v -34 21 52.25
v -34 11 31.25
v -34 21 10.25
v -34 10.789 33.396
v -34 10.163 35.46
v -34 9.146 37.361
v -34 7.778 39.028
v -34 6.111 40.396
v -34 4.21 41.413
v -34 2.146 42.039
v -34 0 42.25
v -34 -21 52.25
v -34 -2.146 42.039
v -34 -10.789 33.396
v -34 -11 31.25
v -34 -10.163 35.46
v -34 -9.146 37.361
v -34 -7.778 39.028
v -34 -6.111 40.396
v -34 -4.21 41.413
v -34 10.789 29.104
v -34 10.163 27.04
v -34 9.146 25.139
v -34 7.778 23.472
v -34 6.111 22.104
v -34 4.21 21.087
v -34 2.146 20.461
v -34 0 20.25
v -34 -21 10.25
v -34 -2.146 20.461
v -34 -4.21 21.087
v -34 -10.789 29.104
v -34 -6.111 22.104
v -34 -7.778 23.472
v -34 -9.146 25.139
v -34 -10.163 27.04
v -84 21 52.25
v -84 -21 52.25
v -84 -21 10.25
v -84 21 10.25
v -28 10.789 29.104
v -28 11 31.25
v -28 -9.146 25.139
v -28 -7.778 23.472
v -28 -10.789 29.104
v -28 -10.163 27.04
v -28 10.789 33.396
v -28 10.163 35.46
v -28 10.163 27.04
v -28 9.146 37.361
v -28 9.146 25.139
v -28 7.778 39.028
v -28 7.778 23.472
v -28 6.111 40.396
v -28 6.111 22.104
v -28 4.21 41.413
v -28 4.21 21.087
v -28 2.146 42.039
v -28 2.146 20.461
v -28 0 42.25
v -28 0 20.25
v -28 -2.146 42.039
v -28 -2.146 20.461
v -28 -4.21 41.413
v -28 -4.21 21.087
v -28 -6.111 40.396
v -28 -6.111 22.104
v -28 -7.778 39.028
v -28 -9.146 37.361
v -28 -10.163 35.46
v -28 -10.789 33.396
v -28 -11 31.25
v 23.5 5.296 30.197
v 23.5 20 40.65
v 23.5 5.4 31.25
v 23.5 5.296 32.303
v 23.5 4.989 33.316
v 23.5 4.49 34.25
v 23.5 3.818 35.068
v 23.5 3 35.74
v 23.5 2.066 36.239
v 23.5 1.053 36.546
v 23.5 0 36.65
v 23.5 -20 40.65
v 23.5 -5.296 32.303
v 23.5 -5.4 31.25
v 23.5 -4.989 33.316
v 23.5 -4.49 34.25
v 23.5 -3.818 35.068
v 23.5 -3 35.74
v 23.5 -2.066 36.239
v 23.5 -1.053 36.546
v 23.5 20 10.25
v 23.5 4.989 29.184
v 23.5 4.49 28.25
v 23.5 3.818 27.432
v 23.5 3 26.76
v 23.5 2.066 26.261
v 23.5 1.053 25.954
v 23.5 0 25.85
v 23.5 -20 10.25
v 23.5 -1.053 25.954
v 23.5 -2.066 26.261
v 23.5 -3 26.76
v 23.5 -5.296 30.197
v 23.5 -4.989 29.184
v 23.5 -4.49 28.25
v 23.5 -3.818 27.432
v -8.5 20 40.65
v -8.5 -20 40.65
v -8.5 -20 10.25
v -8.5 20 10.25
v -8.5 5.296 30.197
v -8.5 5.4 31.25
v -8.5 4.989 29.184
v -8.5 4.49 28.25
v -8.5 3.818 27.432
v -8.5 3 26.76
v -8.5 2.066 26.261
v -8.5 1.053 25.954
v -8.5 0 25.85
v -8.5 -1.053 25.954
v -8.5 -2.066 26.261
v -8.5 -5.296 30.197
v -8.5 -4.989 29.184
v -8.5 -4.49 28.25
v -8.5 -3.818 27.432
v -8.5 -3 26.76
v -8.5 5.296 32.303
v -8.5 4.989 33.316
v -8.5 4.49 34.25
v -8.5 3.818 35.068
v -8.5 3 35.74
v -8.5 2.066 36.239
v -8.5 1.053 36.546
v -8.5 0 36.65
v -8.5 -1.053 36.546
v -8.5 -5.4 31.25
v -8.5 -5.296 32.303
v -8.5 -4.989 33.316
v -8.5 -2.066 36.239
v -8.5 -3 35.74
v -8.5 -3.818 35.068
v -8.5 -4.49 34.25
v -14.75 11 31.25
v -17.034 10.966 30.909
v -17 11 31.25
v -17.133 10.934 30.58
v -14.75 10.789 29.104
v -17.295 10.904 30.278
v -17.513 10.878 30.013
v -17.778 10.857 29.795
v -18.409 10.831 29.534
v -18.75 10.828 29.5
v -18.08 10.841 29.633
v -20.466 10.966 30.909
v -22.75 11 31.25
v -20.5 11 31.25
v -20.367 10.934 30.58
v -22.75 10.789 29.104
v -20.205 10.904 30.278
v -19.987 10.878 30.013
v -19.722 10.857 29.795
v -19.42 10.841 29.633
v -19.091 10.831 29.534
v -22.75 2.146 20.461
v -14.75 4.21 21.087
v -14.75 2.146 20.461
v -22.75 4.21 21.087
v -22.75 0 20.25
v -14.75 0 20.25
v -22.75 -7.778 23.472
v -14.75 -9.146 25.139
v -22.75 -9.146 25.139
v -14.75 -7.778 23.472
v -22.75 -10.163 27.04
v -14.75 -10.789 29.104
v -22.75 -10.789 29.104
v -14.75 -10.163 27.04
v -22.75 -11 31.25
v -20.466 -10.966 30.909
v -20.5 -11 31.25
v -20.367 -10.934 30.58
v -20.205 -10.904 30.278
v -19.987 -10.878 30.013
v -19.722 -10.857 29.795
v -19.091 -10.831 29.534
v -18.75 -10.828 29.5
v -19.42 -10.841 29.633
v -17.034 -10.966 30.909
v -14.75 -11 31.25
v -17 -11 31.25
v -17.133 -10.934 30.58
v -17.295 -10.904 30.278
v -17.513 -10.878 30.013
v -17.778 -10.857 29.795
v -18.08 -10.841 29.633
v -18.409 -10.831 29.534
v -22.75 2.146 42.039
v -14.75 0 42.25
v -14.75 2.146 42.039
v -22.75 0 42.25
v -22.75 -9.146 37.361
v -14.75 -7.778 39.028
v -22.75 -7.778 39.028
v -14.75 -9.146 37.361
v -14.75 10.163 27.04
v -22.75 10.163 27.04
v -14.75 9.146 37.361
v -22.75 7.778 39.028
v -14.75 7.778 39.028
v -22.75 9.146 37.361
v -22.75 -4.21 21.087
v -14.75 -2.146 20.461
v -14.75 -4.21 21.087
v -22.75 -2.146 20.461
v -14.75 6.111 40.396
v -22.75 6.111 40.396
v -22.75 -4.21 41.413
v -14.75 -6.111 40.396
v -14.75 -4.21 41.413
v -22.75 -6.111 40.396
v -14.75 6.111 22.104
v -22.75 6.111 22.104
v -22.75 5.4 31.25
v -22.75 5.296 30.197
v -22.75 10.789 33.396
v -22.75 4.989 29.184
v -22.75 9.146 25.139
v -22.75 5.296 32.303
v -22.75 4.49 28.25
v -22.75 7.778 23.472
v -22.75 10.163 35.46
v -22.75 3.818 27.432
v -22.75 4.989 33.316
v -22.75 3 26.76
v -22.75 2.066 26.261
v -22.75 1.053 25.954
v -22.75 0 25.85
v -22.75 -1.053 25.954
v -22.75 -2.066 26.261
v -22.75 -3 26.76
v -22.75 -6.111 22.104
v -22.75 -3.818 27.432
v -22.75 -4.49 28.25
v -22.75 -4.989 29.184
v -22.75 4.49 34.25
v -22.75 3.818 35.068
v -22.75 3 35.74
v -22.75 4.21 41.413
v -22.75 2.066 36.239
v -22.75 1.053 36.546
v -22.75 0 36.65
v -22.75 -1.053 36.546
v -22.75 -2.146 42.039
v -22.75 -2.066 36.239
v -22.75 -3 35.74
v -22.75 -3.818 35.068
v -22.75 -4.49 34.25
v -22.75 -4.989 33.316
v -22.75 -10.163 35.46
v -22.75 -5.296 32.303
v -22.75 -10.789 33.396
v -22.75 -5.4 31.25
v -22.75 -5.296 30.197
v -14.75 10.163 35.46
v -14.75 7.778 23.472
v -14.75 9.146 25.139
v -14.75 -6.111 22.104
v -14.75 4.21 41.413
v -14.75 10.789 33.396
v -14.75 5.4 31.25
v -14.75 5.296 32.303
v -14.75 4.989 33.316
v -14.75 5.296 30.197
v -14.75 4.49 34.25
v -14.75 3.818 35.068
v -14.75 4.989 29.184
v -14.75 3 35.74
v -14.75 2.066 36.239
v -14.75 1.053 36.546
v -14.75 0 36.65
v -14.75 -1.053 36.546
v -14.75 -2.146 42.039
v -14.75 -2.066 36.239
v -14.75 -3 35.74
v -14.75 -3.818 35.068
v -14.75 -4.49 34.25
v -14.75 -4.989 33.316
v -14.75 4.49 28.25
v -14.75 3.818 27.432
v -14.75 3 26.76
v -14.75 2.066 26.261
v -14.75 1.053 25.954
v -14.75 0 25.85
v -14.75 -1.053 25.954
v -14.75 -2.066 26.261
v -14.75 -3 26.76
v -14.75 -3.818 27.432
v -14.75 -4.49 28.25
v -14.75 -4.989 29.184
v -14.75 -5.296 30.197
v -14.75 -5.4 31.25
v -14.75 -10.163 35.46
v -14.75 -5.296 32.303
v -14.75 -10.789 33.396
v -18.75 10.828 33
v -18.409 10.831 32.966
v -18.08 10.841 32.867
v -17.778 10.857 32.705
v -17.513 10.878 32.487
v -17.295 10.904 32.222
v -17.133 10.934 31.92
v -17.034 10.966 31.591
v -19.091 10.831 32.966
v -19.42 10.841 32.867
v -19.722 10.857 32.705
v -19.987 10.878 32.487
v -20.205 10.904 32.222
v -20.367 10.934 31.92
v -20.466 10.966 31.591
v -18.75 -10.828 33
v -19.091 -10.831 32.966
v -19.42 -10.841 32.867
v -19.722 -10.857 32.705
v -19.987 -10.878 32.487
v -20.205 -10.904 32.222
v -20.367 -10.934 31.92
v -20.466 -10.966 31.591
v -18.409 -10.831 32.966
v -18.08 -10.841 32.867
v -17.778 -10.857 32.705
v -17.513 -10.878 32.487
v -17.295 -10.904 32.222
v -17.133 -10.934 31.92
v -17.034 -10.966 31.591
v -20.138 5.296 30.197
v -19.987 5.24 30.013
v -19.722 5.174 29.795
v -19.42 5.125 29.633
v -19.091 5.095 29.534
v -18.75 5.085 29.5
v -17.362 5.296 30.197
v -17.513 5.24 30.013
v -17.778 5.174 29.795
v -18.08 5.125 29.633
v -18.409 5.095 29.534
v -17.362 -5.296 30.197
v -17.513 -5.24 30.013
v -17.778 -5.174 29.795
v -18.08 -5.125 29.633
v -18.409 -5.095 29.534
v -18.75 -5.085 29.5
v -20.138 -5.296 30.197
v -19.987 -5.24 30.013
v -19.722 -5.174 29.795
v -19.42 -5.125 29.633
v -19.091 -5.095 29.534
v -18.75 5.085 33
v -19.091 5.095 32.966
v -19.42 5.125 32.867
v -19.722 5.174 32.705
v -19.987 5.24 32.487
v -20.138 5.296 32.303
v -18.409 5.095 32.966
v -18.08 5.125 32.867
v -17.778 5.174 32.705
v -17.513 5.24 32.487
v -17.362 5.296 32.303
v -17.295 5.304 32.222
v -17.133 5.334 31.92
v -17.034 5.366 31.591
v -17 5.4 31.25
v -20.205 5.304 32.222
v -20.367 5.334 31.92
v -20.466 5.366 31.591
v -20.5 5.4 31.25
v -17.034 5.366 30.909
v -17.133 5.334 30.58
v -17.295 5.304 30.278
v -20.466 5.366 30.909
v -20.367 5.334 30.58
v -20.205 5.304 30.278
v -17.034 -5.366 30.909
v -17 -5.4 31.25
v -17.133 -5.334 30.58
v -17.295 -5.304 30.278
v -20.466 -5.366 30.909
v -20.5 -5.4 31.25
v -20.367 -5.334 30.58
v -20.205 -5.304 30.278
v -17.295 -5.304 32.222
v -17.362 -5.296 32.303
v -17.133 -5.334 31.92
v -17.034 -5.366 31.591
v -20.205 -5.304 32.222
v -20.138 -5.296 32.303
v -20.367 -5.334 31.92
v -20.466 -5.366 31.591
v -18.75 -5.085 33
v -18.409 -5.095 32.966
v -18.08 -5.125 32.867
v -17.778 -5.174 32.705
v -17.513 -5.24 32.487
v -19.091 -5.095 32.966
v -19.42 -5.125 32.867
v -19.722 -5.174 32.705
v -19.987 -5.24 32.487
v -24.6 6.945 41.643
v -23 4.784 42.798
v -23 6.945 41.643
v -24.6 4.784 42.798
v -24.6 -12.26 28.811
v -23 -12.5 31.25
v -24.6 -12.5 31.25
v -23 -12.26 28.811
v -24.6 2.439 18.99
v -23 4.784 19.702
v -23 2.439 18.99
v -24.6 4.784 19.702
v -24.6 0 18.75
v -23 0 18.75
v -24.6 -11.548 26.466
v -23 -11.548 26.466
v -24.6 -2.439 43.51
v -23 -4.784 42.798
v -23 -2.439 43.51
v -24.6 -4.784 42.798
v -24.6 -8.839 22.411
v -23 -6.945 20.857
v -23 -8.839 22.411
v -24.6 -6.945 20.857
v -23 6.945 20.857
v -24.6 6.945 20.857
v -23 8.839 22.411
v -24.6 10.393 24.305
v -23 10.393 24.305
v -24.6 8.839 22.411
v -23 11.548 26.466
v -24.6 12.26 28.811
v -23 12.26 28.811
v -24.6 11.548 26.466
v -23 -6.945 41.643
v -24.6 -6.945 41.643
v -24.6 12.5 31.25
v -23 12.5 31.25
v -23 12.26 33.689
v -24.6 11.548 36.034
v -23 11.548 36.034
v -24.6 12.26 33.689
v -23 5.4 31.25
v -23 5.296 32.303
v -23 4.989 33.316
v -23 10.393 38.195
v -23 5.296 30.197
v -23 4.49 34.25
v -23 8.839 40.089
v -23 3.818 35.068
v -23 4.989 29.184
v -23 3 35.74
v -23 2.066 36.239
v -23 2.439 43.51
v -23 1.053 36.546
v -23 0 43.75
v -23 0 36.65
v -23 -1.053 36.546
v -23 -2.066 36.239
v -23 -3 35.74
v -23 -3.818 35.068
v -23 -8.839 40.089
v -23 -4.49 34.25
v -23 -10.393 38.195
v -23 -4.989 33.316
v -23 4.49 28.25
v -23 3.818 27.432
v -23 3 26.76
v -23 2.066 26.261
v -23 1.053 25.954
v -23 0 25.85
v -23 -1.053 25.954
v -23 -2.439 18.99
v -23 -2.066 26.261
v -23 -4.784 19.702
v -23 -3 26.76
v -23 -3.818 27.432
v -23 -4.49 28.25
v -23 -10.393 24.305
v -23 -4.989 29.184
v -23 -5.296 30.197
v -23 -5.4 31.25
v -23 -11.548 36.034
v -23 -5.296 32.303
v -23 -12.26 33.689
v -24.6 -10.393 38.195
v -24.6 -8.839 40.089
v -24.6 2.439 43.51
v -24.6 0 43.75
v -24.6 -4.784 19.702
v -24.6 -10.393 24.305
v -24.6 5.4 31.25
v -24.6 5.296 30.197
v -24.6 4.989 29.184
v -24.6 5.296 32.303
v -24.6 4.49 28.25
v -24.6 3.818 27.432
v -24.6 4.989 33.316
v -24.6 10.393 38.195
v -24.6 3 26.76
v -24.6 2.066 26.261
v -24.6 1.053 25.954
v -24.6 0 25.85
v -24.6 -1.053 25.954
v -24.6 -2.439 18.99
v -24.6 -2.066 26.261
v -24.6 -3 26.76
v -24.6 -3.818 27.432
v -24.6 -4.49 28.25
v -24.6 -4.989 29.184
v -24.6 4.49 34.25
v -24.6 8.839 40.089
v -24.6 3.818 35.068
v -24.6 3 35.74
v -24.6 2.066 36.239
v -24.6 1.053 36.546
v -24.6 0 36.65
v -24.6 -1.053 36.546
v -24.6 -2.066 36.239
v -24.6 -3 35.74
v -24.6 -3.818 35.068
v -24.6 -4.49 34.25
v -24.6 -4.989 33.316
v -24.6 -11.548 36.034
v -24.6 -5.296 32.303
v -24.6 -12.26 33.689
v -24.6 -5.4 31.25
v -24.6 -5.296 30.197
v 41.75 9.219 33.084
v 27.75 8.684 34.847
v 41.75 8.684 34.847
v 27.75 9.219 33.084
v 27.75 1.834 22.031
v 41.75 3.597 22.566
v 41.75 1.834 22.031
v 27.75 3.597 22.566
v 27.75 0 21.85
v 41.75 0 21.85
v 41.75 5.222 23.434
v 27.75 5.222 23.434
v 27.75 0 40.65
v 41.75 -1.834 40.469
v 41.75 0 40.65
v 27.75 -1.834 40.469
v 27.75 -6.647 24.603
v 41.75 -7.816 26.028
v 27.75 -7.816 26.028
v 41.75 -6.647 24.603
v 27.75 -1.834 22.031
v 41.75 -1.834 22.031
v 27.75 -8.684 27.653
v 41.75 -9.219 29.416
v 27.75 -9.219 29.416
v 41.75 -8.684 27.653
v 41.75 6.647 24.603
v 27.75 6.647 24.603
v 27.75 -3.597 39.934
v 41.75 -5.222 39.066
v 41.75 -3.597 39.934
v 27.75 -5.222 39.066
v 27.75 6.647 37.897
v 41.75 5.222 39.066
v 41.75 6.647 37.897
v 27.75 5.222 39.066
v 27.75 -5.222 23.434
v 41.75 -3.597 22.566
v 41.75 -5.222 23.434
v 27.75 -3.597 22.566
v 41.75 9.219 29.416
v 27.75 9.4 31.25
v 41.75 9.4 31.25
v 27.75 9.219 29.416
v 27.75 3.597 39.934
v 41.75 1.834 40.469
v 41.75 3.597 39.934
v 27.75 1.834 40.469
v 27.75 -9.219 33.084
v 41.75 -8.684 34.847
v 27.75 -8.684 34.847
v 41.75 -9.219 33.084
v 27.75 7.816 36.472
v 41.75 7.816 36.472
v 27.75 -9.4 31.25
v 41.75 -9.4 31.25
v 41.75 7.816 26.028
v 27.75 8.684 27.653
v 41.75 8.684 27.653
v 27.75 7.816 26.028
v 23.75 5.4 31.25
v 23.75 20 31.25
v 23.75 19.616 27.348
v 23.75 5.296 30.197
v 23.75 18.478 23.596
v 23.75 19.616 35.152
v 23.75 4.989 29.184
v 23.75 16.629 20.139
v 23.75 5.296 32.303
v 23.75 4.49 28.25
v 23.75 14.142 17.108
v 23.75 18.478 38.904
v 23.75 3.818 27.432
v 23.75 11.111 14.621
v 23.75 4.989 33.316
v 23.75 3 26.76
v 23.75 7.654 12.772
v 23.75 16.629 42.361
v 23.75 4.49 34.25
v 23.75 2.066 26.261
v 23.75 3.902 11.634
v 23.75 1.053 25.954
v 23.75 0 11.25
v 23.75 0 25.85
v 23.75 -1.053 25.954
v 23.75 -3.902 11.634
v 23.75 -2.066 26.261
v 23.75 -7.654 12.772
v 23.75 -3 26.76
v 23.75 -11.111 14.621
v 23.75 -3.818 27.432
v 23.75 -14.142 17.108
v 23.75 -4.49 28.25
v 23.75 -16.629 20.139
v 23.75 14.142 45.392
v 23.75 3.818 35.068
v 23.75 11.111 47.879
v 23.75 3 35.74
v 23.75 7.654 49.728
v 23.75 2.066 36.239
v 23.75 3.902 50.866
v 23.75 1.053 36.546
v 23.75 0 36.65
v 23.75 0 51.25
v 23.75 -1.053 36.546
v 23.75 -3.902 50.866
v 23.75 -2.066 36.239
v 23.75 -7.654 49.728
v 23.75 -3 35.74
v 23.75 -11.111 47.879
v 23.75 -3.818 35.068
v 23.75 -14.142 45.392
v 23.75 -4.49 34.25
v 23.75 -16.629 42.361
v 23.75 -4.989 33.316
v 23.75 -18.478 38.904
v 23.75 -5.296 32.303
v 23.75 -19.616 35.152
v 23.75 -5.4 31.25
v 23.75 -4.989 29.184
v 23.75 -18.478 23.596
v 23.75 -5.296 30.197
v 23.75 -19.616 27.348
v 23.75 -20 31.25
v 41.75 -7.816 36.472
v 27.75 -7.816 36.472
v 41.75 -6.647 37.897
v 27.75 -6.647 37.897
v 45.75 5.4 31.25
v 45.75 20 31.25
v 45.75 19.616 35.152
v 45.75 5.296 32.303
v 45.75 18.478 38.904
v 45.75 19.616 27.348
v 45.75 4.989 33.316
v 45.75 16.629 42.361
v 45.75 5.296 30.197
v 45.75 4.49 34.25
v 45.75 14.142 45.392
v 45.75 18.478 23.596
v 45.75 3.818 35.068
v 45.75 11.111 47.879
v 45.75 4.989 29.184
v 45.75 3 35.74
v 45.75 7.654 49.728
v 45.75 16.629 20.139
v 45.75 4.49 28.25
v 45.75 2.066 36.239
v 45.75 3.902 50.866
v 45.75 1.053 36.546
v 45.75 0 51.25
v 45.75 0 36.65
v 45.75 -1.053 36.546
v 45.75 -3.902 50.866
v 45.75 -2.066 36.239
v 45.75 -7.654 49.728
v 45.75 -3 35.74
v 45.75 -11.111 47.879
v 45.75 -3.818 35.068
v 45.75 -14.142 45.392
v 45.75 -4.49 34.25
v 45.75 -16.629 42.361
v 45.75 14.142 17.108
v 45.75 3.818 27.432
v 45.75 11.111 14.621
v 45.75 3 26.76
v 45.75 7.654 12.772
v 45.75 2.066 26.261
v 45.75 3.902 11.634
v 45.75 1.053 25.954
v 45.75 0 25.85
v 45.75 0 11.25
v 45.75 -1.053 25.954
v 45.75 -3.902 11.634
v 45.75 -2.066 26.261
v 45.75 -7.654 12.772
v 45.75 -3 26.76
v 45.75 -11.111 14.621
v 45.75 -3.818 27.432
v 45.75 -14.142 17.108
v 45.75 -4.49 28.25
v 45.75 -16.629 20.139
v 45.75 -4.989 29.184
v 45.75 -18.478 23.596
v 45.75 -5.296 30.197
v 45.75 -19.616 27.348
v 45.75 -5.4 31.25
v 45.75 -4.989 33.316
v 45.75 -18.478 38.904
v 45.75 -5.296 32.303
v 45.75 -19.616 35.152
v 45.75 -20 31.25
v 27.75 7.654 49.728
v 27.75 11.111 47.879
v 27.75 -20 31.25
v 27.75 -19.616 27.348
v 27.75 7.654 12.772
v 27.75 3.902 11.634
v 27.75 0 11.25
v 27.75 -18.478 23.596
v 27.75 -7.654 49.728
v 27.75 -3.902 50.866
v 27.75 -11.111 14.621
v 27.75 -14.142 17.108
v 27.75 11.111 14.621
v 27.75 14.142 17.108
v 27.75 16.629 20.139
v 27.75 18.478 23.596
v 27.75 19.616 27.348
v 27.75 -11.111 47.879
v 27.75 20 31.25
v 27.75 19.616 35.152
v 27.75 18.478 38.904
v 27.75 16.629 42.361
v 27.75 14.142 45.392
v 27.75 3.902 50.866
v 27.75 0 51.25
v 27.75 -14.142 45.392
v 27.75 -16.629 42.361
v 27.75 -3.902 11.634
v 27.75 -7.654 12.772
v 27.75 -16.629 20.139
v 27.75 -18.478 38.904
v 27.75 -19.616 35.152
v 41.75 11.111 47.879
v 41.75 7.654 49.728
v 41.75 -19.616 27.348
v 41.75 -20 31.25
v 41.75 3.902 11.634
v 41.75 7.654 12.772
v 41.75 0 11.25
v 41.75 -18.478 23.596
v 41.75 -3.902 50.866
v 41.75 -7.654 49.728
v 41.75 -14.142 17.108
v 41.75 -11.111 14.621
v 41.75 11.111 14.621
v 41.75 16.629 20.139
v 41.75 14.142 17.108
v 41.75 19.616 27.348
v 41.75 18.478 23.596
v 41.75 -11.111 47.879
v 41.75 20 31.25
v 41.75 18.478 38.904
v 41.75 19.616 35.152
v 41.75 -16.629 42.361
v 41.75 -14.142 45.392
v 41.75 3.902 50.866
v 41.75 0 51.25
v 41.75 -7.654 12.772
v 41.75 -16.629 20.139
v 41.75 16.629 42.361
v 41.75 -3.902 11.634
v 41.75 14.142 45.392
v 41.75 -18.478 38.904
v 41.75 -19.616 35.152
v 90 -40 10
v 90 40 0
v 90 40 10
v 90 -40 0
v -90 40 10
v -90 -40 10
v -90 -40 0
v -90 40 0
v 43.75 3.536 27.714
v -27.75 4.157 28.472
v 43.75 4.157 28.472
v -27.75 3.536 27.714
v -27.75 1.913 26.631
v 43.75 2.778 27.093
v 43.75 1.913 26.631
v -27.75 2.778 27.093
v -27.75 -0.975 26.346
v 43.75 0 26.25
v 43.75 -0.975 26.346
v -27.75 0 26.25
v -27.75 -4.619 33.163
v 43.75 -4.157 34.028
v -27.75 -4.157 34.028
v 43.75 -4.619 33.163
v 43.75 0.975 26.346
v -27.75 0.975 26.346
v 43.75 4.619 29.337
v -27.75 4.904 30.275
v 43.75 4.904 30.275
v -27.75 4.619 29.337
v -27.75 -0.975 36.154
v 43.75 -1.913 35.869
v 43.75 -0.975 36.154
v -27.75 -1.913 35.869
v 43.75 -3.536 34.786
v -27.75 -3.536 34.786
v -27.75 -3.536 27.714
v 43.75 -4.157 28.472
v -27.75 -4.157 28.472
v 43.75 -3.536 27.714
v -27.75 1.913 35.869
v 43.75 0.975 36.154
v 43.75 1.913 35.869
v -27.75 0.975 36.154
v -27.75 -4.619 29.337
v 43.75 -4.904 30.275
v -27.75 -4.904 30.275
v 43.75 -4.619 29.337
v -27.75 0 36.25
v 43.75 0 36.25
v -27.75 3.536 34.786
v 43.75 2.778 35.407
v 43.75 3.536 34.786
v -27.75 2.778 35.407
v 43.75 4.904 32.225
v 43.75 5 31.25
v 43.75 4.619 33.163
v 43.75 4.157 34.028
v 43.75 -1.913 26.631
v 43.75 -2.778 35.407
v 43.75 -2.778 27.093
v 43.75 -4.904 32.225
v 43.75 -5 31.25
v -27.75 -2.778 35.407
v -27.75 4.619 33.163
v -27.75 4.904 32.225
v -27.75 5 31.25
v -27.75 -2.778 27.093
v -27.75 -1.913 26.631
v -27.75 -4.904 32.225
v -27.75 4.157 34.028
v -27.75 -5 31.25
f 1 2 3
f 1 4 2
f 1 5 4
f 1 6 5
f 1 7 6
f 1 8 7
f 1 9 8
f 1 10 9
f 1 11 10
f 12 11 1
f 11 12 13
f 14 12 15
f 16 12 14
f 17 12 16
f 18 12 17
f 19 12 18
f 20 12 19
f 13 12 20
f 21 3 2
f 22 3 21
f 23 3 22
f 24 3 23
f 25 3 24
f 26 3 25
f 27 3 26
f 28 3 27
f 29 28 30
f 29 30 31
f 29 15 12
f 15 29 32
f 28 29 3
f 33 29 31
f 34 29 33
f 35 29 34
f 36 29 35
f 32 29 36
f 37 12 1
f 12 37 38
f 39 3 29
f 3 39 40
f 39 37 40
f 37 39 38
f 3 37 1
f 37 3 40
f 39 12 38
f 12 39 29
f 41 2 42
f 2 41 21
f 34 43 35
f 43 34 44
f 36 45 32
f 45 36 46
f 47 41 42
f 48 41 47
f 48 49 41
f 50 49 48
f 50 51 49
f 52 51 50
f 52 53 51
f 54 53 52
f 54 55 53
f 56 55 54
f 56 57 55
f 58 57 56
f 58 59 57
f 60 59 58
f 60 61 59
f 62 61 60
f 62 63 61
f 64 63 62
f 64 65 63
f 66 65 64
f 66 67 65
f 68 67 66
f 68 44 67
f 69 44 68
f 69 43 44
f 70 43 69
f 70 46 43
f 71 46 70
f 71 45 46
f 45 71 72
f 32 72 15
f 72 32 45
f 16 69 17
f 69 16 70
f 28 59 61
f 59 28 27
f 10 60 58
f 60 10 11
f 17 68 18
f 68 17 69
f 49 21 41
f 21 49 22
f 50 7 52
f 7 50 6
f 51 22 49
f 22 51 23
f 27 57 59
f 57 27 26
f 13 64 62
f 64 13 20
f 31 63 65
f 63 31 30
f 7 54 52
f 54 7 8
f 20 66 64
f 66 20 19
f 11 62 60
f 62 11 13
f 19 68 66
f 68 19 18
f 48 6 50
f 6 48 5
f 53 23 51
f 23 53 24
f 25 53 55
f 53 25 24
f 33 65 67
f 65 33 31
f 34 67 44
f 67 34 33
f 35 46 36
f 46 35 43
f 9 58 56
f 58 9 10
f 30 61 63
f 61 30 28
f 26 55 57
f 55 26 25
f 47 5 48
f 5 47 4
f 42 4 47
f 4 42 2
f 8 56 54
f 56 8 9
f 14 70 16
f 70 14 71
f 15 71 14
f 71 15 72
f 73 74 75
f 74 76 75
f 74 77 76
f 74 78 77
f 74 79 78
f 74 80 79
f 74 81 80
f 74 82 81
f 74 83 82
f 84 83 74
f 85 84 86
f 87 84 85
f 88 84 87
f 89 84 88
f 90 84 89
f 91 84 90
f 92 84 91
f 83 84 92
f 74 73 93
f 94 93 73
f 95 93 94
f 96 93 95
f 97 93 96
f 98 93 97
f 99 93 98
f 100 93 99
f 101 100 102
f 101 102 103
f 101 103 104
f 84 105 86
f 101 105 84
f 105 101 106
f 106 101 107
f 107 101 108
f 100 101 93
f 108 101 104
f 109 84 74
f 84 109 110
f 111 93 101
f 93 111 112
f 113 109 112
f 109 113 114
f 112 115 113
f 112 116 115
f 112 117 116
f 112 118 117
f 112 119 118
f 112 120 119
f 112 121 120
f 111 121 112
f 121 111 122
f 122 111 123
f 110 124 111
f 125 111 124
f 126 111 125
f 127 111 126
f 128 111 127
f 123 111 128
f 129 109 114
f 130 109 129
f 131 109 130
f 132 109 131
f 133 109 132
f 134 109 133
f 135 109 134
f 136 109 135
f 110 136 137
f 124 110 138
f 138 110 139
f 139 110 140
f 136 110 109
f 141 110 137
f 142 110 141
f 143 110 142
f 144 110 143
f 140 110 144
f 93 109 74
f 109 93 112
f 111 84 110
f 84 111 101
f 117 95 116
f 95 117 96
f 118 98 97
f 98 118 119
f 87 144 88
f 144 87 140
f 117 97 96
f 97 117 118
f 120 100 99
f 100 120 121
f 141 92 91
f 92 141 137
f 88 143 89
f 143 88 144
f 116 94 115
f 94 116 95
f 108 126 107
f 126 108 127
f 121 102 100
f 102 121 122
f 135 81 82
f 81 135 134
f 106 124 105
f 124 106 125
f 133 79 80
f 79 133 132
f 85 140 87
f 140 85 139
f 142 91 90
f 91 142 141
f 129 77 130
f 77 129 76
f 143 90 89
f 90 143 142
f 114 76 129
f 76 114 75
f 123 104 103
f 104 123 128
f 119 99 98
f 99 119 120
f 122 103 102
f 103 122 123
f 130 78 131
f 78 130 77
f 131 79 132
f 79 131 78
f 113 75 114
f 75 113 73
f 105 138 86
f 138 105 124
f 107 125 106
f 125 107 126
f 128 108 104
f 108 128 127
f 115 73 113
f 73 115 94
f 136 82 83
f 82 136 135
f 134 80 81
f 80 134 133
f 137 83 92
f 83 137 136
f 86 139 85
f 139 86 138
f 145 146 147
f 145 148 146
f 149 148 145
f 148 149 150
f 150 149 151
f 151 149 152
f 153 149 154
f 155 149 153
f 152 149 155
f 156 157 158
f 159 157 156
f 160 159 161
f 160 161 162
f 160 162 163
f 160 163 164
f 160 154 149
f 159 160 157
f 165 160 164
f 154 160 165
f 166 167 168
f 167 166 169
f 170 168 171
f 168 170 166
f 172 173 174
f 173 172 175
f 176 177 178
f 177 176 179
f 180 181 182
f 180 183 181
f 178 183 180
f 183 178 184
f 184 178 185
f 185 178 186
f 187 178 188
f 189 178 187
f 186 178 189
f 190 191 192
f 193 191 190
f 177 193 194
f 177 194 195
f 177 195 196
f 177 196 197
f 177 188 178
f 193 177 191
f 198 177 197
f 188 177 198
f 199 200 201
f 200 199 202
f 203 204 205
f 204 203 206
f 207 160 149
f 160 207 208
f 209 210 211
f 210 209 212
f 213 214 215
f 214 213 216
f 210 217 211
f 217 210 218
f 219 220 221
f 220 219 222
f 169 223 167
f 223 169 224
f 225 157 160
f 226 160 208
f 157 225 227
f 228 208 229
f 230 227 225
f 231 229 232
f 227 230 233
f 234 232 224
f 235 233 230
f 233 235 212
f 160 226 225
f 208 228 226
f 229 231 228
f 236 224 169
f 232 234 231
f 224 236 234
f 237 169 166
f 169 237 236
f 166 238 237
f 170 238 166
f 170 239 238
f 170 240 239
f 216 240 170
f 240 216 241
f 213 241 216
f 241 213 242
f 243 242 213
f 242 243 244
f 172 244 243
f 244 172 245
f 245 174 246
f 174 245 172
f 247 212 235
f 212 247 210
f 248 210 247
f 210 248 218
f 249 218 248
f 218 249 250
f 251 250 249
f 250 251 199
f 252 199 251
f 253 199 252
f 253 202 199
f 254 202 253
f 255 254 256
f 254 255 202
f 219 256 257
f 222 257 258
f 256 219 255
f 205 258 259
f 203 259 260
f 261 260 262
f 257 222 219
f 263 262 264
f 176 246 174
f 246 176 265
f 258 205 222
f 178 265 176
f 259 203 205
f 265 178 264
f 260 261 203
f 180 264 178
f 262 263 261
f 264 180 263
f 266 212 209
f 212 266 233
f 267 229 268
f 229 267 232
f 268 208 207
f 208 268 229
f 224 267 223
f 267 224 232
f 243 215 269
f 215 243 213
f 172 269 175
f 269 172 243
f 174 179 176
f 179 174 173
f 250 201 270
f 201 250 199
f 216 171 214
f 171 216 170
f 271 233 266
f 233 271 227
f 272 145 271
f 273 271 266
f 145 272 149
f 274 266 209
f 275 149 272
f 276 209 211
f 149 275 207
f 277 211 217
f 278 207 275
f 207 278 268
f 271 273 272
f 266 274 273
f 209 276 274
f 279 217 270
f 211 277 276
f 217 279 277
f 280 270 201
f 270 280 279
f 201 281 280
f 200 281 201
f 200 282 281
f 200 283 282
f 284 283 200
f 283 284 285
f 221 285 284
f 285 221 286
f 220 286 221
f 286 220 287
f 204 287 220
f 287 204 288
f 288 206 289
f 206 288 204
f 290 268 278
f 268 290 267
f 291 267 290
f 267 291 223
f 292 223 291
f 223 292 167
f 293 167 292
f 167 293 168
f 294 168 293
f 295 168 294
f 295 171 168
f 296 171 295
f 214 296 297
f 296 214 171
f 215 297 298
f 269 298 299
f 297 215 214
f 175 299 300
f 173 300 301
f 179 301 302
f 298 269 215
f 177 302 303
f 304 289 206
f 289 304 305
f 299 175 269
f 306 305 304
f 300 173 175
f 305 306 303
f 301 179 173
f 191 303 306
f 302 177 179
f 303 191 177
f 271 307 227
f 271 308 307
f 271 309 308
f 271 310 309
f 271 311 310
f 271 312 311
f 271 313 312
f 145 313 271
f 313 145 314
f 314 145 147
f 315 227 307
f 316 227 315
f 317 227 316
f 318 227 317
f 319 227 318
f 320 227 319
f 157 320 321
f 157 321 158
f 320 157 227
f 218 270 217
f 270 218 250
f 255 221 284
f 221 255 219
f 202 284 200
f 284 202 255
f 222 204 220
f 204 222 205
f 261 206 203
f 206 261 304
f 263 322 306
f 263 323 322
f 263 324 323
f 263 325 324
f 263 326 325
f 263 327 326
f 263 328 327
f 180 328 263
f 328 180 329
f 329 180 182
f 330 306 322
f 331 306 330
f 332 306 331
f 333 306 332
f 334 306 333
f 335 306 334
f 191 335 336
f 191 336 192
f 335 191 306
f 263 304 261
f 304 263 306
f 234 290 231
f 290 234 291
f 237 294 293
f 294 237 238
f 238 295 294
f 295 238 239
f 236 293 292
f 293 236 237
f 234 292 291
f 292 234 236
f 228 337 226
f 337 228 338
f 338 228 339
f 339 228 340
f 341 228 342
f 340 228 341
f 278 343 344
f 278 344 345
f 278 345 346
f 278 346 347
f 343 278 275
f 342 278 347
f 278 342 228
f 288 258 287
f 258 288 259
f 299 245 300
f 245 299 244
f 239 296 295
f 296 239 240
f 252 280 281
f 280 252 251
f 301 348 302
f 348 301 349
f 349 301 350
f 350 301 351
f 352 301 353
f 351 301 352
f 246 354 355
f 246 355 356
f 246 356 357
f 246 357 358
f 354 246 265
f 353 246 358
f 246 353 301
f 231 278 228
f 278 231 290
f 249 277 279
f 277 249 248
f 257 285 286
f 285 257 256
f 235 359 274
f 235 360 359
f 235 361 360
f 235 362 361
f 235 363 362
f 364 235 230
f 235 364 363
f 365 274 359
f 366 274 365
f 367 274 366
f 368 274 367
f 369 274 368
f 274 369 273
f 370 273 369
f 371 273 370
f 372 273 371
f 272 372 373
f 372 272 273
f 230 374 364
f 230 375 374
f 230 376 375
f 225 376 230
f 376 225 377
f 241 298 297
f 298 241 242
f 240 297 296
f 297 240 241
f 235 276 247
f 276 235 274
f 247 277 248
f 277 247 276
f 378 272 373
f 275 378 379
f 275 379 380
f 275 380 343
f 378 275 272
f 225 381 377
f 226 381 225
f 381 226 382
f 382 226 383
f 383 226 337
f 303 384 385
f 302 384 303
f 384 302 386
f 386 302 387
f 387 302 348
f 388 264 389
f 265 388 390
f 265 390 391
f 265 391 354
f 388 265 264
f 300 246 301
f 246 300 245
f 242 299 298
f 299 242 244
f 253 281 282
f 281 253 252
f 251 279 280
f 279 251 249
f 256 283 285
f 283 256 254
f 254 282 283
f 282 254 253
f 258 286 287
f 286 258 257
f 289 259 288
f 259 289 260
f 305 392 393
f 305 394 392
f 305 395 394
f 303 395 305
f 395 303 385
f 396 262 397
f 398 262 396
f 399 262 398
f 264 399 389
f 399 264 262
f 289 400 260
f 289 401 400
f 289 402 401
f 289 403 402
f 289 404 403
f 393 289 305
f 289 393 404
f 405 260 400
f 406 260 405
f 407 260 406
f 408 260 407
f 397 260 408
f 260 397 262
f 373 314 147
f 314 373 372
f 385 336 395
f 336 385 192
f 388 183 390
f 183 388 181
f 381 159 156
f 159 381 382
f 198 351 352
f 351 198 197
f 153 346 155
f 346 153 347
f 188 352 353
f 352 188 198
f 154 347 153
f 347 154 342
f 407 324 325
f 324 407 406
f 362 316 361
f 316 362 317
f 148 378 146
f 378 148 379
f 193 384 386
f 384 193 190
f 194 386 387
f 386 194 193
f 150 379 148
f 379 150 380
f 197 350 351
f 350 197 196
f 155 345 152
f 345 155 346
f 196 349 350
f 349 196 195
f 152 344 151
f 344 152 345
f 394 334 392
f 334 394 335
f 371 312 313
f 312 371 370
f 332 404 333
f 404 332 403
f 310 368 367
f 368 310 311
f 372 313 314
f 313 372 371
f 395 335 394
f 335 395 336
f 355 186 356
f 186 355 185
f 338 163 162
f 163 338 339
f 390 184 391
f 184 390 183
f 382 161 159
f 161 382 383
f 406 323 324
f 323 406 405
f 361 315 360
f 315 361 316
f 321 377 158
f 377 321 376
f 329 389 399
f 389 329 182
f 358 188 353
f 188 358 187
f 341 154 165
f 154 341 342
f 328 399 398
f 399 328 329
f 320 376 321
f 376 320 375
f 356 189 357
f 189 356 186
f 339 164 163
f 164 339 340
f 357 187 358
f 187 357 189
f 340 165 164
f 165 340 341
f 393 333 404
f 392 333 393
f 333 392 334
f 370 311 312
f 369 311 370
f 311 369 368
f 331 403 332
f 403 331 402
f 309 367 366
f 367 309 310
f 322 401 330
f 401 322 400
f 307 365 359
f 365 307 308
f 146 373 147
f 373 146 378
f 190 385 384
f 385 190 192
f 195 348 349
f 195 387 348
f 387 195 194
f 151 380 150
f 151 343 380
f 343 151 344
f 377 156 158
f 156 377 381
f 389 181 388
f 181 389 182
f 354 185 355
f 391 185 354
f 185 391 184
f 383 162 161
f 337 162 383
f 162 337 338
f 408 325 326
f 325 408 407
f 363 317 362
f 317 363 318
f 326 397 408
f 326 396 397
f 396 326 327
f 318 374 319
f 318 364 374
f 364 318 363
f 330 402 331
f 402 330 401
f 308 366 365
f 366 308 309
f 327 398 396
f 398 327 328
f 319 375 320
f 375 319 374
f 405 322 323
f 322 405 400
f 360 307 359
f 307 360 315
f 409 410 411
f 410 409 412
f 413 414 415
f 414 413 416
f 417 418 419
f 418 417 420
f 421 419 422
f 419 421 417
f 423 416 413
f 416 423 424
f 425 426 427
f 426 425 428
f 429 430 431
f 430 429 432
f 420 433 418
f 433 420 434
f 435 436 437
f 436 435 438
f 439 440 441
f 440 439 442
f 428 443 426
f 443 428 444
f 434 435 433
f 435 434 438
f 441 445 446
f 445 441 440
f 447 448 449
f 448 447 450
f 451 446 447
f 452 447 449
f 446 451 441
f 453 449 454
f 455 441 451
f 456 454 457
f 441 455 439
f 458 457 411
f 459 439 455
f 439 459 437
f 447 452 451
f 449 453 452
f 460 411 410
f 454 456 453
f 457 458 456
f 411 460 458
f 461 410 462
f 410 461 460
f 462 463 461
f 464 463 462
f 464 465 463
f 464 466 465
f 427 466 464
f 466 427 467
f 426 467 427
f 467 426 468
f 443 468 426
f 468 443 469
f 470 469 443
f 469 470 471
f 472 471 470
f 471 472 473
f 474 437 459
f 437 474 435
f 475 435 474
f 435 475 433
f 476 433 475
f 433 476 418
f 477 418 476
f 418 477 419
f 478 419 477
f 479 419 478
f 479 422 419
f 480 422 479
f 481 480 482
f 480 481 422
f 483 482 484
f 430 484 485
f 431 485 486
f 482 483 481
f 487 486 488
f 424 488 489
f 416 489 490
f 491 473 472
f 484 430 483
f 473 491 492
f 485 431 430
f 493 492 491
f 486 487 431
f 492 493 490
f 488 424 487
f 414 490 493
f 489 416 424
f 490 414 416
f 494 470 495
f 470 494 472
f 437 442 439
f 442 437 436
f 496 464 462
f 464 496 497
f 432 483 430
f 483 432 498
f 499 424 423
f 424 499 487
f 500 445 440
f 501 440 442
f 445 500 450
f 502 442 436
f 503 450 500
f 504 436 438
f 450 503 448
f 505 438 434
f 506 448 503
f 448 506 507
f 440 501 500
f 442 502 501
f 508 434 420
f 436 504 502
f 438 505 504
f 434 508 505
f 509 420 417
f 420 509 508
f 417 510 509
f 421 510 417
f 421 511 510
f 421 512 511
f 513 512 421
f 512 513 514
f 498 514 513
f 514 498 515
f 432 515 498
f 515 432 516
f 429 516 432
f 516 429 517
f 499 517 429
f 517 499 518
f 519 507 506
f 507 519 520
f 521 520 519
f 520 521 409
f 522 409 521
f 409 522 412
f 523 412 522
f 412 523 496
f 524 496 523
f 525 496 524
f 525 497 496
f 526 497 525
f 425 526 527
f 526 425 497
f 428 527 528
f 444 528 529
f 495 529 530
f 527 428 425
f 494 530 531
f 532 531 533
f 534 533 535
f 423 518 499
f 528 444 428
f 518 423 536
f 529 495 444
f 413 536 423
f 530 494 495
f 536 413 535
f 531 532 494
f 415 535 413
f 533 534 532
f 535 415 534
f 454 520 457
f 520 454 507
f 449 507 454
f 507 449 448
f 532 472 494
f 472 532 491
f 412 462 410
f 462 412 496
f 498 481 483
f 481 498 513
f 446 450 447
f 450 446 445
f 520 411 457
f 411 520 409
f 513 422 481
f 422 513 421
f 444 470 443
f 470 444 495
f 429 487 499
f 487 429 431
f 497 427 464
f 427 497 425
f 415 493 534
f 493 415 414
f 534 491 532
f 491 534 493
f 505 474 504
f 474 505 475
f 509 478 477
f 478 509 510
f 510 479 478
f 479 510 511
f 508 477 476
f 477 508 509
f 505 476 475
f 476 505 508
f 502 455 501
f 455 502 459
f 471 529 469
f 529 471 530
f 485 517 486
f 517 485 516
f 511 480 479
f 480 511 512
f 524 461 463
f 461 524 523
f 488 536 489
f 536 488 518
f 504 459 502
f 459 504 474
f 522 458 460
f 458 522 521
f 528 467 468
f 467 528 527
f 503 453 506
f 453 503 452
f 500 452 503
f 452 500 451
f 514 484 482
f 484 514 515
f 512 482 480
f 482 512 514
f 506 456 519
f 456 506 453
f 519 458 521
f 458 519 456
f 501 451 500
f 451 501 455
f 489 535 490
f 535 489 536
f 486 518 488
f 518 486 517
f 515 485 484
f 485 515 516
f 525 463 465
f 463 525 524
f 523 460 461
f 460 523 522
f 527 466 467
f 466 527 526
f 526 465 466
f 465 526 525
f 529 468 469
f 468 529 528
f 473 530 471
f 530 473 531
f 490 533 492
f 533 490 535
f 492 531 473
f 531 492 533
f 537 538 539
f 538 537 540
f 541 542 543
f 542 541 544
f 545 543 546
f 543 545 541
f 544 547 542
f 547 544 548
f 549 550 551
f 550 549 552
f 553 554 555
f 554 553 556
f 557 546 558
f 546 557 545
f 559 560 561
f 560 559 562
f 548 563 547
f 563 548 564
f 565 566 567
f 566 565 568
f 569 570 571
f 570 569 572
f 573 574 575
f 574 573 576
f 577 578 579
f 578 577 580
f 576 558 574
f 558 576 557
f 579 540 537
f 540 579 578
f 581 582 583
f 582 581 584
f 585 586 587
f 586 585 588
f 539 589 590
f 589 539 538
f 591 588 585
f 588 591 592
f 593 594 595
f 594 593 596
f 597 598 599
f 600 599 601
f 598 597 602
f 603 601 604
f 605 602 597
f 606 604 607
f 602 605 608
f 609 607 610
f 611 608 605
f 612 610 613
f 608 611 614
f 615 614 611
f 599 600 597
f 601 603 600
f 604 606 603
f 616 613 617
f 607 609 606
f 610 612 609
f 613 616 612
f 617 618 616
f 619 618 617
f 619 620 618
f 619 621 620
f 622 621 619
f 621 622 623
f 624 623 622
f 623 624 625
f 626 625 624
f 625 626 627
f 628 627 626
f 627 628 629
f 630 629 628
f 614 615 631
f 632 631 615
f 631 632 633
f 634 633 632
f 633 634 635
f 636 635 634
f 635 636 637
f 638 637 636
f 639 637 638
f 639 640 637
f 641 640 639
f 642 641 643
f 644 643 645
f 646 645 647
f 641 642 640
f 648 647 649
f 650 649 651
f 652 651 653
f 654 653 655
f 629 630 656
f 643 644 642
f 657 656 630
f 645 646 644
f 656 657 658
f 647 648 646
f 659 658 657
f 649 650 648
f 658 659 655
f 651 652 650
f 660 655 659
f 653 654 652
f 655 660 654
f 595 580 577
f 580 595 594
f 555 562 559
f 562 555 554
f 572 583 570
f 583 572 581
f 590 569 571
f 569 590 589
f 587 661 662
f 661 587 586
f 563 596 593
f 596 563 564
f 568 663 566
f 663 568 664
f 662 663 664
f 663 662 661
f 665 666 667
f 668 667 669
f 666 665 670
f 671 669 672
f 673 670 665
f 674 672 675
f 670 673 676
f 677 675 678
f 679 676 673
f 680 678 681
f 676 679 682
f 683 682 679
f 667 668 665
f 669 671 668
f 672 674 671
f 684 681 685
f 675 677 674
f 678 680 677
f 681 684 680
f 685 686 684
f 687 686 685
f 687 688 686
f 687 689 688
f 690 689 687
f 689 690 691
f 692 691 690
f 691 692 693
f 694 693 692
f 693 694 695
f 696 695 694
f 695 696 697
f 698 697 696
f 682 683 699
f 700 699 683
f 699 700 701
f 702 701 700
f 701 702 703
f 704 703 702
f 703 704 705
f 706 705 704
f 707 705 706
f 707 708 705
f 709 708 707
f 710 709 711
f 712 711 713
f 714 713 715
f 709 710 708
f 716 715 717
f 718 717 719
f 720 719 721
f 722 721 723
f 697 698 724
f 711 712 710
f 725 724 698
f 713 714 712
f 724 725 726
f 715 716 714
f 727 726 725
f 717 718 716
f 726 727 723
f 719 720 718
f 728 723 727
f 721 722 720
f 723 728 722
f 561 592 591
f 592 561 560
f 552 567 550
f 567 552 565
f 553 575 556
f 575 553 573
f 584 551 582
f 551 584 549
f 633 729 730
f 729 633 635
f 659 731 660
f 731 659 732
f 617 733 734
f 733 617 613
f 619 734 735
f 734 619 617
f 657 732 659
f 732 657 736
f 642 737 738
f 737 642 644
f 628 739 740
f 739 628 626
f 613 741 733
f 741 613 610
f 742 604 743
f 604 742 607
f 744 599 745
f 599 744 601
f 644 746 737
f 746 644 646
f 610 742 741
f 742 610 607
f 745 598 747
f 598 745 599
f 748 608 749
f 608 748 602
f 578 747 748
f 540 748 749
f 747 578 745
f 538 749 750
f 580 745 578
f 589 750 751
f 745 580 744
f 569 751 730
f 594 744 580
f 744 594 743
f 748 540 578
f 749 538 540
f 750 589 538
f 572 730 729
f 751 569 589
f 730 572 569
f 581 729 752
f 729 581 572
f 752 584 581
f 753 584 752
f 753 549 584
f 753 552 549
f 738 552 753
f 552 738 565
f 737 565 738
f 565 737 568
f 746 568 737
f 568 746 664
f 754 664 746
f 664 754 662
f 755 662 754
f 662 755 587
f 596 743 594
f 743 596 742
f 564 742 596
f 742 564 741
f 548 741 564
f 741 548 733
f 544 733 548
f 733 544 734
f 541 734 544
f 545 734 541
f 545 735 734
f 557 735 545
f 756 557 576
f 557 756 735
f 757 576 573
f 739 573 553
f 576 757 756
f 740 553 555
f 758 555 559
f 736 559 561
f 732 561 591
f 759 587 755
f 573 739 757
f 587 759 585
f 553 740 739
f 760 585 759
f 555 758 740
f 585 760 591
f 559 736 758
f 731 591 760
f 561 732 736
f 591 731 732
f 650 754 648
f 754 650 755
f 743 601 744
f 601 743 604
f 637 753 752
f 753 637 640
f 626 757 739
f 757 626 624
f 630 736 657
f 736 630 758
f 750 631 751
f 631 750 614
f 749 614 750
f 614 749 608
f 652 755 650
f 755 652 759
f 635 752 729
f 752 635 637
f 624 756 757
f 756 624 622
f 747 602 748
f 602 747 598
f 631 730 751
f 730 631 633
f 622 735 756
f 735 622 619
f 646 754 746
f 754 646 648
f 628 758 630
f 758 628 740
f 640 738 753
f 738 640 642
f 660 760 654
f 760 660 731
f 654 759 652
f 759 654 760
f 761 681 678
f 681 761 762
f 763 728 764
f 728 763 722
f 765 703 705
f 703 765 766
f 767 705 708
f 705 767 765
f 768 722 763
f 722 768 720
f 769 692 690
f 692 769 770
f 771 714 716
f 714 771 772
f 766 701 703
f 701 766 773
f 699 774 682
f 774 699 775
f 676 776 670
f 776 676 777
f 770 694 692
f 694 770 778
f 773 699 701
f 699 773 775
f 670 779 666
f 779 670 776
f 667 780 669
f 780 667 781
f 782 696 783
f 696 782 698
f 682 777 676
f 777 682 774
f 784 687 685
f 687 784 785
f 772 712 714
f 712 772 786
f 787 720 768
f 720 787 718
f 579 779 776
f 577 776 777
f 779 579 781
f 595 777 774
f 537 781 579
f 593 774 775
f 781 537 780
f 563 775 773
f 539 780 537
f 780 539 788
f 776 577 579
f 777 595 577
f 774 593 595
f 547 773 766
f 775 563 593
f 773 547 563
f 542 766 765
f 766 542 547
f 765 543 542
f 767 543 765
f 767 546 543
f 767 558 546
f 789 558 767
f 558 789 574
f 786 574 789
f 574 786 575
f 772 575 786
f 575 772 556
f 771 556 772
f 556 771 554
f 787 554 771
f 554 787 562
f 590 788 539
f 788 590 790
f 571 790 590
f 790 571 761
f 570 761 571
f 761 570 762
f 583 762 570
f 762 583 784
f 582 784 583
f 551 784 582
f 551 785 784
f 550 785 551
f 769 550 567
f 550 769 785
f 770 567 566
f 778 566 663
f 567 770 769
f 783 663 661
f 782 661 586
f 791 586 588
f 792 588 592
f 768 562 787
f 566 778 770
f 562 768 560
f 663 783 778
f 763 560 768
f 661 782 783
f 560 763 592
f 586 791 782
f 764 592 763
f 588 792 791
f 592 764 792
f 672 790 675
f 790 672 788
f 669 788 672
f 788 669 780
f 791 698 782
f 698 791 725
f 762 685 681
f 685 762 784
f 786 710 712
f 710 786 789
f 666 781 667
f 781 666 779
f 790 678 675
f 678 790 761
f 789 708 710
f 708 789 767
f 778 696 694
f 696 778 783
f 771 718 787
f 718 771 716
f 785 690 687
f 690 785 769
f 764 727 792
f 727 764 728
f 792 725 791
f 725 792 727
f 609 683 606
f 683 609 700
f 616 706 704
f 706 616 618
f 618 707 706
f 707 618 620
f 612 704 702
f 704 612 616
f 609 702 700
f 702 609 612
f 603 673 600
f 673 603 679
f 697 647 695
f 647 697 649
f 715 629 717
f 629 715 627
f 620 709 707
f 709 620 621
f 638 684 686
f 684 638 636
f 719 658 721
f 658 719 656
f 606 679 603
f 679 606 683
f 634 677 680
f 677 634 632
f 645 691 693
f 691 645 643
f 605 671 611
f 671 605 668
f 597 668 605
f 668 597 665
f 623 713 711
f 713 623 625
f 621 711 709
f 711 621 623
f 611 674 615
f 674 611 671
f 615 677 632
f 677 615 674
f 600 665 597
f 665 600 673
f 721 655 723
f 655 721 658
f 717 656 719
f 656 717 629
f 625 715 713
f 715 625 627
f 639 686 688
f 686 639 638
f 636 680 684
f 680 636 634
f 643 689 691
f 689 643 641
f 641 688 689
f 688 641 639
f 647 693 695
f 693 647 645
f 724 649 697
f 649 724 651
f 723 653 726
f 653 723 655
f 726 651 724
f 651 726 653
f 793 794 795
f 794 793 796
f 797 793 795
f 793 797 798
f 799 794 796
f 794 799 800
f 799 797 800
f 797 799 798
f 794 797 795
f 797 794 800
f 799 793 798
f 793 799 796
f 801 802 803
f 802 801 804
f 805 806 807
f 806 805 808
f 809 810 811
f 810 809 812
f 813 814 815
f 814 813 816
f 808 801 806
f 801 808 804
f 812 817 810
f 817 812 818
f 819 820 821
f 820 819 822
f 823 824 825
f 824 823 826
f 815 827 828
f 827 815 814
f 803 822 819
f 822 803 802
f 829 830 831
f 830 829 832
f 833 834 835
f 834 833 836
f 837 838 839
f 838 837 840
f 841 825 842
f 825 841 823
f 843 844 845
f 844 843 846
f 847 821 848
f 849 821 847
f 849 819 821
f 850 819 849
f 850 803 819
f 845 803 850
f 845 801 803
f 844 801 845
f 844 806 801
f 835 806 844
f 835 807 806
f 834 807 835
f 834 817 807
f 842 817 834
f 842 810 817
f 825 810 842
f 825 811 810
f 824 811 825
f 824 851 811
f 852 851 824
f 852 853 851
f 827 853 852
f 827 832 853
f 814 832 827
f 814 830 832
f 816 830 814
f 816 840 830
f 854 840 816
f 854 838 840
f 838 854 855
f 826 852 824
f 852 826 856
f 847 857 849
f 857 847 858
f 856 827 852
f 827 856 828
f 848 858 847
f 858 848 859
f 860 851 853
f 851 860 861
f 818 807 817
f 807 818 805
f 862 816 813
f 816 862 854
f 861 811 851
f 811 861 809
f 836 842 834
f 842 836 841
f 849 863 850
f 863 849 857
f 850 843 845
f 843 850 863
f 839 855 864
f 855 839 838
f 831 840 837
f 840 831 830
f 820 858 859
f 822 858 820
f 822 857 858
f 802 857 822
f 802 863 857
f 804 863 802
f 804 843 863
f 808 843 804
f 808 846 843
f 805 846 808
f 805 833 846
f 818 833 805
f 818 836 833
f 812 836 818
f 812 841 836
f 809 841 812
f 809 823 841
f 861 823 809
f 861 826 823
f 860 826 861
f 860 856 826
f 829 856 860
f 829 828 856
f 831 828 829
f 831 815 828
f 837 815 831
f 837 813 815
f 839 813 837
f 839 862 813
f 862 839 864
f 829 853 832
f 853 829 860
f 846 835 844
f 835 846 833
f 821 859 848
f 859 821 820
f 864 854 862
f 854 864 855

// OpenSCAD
$fn = 32;

// ------------------------------------------------------------------------
// Motor drive station: motor 50 x 42 mm, shaft d10, pulley d40
// Every part is its own module, assembly() places every instance.
// ------------------------------------------------------------------------

// --- part 1 ---
module station_bed() {
  difference() {
    translate([-90, -40, 0]) cube([180, 80, 10]);
  }
}

// --- part 2 ---
module drive_motor() {
  union() {
    translate([-25, -21, 0]) cube([50, 42, 42]);
    translate([28, 0, 21]) rotate([0, 90, 0]) cylinder(h = 6, d = 22, center = true);
  }
}

// --- part 3 ---
module pillow_block() {
  difference() {
    translate([-16, -20, 0]) cube([32, 40, 30.4]);
    translate([0, 0, 21]) rotate([0, 90, 0]) cylinder(h = 34, d = 10.8, center = true);
  }
}

// --- part 4 ---
module drive_shaft() {
  translate([0, 0, -35.75]) cylinder(h = 71.5, d = 10);
}

// --- part 5 ---
module shaft_collar() {
  difference() {
    cylinder(h = 8, d = 22);
    translate([0, 0, -1]) cylinder(h = 10, d = 10.8);
    translate([0, 0, 4]) rotate([90, 0, 0]) cylinder(h = 24, d = 3.5, center = true);
  }
}

// --- part 6 ---
module collar_washer() {
  difference() {
      translate([0, 0, 0]) cylinder(h = 1.6, d = 25);
      translate([0, 0, -1]) cylinder(h = 3.6, d = 10.8);
    }
}

// --- part 7 ---
module drive_pulley() {
  difference() {
    union() {
      cylinder(h = 22, d = 18.8);
      cylinder(h = 4, d = 40);
      translate([0, 0, 18]) cylinder(h = 4, d = 40);
    }
    translate([0, 0, -1]) cylinder(h = 24, d = 10.8);
  }
}

// --- assembly ---
module assembly() {
  color([0.80, 0.24, 0.20]) translate([0, 0, 0]) rotate([0, 0, 0]) station_bed();
  color([0.20, 0.45, 0.75]) translate([-59, 0, 10.25]) rotate([0, 0, 0]) drive_motor();
  color([0.25, 0.62, 0.32]) translate([7.5, 0, 10.25]) rotate([0, 0, 0]) pillow_block();
  color([0.92, 0.70, 0.18]) translate([8, 0, 31.25]) rotate([0, 90, 0]) drive_shaft();
  color([0.58, 0.35, 0.70]) translate([-22.75, 0, 31.25]) rotate([0, 90, 0]) shaft_collar();
  color([0.16, 0.66, 0.66]) translate([-24.6, 0, 31.25]) rotate([0, 90, 0]) collar_washer();
  color([0.85, 0.48, 0.18]) translate([23.75, 0, 31.25]) rotate([0, 90, 0]) drive_pulley();
}

assembly();
